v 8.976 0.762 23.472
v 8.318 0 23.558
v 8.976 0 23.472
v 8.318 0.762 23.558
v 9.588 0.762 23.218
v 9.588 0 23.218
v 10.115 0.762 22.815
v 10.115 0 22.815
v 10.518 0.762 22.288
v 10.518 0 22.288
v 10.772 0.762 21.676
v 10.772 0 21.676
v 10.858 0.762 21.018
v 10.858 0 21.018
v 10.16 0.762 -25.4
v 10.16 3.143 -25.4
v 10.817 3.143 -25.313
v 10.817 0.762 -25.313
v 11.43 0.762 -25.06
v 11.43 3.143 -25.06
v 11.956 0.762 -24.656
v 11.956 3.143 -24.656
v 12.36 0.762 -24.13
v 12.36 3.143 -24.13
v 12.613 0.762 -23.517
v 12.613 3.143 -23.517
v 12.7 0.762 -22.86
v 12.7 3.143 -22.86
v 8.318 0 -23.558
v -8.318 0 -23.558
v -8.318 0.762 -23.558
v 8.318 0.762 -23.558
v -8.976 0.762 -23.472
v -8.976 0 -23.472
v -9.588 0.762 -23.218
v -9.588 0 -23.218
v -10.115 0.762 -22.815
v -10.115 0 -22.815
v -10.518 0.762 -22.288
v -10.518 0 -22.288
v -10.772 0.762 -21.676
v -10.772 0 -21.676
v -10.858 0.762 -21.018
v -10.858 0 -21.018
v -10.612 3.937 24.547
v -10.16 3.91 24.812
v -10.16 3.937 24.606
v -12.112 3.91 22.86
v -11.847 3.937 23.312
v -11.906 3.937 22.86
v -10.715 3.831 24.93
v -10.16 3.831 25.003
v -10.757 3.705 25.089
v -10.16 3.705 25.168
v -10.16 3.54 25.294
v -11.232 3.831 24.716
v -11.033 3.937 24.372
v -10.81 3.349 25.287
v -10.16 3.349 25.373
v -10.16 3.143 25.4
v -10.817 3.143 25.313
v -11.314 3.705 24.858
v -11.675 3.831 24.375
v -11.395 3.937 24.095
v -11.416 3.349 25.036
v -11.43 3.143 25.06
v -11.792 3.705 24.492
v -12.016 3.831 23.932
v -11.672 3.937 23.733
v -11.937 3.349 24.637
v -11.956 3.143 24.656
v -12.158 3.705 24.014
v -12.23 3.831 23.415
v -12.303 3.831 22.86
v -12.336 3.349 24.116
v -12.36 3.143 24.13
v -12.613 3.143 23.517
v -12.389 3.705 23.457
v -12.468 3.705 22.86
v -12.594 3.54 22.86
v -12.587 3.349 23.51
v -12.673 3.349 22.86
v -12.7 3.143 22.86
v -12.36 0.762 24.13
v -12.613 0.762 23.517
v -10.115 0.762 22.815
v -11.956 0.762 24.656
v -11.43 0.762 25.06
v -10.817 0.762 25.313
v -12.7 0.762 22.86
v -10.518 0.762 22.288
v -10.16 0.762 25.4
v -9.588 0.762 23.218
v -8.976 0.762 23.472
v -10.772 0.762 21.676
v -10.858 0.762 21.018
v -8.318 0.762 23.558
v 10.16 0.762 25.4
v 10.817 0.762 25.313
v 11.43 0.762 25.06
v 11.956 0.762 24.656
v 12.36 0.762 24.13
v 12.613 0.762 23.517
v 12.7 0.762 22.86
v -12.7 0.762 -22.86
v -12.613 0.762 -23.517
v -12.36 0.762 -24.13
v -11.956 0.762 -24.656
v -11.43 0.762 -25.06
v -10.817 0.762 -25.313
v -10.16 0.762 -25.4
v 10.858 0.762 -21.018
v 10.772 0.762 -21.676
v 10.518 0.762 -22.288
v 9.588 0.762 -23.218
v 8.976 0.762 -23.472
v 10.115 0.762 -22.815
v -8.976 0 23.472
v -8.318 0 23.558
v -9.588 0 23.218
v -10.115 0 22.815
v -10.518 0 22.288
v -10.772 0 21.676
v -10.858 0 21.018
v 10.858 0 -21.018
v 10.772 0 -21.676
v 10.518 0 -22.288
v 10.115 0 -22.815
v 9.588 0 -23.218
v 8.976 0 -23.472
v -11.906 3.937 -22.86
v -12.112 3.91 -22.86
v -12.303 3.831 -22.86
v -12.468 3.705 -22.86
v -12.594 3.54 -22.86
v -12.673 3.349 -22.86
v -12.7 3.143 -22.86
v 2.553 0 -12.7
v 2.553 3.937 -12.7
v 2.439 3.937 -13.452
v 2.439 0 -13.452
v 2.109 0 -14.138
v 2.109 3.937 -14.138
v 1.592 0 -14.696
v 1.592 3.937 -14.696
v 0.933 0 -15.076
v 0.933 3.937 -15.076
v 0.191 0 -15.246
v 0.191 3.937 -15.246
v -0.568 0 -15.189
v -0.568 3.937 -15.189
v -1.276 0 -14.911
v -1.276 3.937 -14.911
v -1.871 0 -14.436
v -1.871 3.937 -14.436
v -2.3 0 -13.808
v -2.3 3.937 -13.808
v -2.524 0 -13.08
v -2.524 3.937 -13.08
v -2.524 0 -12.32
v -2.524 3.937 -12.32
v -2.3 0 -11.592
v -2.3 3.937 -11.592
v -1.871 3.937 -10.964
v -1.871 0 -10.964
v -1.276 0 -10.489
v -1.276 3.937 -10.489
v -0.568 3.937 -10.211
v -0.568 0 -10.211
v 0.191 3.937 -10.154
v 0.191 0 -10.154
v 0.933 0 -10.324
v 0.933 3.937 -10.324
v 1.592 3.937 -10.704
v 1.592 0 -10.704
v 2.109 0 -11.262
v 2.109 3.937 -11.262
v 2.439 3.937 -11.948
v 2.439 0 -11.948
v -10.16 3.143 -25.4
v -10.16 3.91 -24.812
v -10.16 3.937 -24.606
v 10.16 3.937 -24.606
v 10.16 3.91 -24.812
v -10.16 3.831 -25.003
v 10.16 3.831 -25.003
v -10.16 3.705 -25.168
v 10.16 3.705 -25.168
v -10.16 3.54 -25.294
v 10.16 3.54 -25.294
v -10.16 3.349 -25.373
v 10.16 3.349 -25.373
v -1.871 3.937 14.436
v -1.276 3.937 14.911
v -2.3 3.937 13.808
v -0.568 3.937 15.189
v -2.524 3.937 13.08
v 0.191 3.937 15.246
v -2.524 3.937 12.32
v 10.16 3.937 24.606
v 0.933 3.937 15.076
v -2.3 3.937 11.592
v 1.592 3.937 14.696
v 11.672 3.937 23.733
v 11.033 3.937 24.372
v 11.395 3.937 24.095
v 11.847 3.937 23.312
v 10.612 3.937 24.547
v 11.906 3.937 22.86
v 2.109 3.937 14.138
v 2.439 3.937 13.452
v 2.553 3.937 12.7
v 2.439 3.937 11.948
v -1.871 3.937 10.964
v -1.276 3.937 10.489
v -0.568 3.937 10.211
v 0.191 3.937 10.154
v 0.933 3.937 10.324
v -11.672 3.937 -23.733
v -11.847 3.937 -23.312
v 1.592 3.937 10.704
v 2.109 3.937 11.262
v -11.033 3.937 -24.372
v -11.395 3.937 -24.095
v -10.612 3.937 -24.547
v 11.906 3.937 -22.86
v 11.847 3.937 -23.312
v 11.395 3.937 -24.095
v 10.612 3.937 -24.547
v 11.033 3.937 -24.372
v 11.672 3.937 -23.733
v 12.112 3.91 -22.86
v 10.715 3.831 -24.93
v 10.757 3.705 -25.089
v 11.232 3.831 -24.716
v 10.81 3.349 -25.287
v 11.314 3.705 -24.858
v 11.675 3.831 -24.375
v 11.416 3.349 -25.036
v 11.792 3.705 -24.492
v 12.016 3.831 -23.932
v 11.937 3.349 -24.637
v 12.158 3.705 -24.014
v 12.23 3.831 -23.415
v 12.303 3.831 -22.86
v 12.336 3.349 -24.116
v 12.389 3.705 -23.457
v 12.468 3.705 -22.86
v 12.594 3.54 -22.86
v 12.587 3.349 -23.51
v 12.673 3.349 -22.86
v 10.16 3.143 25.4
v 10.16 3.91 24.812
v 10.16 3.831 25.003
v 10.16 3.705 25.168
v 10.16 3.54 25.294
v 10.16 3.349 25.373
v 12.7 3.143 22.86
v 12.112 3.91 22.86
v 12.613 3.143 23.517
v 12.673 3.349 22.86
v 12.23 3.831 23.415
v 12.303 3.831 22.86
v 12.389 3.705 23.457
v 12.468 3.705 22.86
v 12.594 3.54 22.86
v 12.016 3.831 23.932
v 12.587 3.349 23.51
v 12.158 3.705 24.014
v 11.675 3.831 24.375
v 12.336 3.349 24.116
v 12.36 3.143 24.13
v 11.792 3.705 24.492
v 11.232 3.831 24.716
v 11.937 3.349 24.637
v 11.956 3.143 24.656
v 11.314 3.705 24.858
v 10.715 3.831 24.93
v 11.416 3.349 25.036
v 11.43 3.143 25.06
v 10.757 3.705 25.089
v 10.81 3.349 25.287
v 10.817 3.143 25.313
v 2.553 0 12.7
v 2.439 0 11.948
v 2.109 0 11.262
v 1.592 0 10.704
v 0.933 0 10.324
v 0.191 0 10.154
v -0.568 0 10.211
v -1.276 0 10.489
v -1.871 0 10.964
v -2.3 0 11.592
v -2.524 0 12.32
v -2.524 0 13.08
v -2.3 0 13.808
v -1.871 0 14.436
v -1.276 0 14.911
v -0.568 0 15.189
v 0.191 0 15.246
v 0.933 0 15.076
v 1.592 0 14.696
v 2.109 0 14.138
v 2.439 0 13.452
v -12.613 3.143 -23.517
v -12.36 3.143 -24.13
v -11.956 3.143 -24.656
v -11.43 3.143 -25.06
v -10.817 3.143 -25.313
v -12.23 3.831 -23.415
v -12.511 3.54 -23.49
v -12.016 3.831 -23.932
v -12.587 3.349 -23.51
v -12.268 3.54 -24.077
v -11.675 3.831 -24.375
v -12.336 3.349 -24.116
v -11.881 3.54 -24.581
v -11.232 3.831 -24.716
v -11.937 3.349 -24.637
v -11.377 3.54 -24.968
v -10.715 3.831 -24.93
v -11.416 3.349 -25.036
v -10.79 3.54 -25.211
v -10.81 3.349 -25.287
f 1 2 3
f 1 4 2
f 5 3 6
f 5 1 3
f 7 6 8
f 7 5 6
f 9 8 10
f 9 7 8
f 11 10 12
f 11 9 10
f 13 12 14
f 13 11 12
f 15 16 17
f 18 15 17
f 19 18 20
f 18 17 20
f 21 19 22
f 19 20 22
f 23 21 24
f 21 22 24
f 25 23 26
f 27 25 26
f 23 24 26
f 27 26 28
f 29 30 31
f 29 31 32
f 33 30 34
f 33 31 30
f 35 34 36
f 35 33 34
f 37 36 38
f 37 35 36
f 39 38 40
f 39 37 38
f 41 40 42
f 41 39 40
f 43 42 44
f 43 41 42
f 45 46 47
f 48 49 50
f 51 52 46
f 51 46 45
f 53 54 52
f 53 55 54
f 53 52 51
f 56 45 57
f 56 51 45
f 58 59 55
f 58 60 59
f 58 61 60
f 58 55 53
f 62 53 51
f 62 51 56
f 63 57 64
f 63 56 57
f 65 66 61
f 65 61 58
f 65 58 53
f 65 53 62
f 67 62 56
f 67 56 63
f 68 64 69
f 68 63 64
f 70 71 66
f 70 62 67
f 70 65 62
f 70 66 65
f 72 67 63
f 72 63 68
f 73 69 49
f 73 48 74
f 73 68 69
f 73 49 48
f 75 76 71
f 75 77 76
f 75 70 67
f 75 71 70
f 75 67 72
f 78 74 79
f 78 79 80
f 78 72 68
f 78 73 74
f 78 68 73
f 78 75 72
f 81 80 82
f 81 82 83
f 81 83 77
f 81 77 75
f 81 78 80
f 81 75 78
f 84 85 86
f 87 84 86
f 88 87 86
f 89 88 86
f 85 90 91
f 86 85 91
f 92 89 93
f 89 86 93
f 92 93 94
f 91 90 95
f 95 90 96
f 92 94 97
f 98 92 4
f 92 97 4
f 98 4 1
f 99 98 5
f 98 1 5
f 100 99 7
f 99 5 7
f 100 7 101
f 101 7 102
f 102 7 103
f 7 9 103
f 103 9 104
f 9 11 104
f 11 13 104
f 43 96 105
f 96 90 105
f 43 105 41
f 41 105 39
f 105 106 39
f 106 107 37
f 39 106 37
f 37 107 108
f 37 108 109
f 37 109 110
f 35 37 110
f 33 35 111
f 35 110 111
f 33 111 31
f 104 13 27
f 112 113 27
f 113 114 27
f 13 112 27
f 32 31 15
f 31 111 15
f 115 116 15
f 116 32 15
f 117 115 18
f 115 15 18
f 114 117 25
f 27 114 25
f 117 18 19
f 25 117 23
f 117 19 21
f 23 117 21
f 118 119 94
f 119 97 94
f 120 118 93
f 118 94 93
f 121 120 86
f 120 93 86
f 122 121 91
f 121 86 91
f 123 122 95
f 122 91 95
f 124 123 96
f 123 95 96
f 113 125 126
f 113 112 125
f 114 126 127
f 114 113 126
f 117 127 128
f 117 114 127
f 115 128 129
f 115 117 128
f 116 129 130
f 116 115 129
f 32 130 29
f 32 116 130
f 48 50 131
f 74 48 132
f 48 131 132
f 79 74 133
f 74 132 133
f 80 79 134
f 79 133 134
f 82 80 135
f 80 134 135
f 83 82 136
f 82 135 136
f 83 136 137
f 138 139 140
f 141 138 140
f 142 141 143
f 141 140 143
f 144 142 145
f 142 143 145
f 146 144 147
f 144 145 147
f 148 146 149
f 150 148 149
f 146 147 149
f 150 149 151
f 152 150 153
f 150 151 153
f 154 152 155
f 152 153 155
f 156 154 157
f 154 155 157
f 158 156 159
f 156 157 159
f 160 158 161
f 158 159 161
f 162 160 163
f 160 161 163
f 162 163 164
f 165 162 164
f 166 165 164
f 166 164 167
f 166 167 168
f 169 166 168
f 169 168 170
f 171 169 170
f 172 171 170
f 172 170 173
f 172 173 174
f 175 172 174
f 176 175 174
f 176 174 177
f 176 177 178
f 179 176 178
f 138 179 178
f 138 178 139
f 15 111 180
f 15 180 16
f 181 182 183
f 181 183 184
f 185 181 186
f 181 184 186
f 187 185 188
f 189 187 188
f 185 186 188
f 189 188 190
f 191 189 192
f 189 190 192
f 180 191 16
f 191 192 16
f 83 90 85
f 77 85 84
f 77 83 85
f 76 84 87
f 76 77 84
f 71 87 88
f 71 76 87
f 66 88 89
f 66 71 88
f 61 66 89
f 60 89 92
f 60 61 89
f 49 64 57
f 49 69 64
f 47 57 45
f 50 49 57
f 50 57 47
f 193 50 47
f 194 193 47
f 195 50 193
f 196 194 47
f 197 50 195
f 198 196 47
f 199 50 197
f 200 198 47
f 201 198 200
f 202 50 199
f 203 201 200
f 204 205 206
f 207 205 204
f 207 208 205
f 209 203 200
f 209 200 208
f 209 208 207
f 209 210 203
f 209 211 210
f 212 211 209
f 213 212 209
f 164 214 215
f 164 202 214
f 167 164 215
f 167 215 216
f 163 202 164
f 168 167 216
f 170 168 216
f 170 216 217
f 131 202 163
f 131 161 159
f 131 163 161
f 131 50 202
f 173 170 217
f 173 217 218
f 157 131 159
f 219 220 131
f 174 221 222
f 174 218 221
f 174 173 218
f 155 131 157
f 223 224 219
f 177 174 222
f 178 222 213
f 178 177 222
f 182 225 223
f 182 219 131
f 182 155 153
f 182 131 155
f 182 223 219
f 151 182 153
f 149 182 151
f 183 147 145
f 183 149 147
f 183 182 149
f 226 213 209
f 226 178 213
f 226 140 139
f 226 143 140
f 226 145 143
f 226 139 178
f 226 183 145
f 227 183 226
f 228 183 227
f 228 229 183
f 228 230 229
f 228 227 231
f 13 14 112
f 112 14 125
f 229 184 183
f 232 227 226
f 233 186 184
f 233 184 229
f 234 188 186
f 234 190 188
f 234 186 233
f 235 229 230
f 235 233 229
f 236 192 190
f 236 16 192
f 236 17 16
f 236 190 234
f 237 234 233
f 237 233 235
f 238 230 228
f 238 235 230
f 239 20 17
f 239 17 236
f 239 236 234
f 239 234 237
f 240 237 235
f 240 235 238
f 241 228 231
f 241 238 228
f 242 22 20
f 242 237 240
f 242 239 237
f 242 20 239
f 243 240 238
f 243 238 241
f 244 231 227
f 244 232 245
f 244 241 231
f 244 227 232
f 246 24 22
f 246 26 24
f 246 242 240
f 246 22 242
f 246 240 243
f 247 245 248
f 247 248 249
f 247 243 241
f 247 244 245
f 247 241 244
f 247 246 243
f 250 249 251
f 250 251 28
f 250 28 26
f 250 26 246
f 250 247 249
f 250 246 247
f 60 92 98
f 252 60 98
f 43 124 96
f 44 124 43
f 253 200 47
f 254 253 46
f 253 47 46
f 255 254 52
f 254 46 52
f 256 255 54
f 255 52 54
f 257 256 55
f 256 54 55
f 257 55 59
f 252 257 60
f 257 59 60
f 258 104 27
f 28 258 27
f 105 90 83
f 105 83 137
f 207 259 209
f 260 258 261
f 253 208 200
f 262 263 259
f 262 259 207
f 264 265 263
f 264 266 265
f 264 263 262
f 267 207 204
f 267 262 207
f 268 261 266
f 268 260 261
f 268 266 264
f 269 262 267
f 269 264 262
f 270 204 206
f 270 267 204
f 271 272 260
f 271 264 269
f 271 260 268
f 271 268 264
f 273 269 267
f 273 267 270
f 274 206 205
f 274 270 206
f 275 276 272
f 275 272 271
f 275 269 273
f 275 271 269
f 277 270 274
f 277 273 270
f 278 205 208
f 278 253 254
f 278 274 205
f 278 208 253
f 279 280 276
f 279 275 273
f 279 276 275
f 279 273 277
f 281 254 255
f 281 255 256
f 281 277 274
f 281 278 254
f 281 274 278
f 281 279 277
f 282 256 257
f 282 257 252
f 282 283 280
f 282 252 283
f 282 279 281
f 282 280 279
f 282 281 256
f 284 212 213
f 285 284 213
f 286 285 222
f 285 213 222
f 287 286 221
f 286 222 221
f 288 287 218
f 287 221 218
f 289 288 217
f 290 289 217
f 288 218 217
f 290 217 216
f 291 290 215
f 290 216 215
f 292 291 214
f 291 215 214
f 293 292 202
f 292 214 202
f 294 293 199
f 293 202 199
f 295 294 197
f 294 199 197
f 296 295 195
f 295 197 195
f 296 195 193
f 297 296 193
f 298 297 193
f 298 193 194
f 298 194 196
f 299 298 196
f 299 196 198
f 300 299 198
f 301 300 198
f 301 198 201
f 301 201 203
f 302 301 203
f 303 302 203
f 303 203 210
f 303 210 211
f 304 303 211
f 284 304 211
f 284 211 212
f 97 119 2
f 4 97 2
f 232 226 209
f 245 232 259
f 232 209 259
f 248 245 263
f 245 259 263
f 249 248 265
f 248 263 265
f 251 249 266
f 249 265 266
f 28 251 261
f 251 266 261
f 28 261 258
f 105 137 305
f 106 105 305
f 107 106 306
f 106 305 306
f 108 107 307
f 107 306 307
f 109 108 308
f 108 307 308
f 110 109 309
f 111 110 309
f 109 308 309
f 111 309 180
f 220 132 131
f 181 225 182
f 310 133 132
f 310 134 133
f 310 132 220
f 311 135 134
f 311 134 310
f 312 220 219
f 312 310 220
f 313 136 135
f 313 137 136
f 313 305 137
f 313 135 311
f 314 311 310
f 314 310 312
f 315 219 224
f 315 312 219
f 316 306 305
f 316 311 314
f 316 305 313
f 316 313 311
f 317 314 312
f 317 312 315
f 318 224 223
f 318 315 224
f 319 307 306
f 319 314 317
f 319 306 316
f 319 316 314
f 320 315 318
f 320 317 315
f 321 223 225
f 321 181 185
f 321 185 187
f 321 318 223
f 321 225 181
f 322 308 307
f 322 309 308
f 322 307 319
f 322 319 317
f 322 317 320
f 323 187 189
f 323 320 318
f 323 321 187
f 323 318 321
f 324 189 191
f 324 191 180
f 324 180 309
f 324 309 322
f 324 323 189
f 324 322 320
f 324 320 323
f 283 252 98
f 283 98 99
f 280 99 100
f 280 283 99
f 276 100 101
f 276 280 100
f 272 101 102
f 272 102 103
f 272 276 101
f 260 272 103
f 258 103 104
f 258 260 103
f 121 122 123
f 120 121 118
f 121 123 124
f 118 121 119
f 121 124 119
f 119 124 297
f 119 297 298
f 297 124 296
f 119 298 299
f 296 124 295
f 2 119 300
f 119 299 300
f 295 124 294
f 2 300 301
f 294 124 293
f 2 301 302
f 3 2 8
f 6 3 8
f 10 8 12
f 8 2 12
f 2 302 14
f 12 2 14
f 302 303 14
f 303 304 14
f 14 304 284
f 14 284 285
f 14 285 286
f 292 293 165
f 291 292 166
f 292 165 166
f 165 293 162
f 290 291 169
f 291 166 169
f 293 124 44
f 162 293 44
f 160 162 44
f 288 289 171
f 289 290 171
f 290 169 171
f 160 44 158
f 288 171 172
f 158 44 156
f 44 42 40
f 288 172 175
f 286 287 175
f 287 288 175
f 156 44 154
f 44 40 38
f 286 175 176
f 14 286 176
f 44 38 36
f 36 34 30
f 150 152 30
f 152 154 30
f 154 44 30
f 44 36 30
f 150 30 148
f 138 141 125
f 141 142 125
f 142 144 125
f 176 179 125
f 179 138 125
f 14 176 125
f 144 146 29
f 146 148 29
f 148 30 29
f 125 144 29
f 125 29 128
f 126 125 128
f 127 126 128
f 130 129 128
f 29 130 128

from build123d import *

# Parameters (mm, degrees)
SKETCH1_W           = 21.717
SKETCH1_H           = 47.117
BOSS_EXTRUDE1_DEPTH = 0.762
SKETCH2_W           = 25.4
SKETCH2_H           = 50.8
BOSS_EXTRUDE2_DEPTH = 3.175
SKETCH3_R           = 2.5527
CUT_EXTRUDE1_DEPTH  = 4.937
FILLET1_R           = 2.54
FILLET3_R           = 0.79375


with BuildPart() as part:
    # Sketch1 → Boss-Extrude1 (new body)
    with BuildSketch(Plane(origin=(0, 0, 0), x_dir=(1, 0, 0), z_dir=(0, 1, 0))):
        Rectangle(SKETCH1_W, SKETCH1_H)
    extrude(amount=BOSS_EXTRUDE1_DEPTH)

    # Sketch2 → Boss-Extrude2 (add)
    with BuildSketch(Plane(origin=(0, 0.762, 0), x_dir=(1, 0, 0), z_dir=(0, 1, 0))):
        Rectangle(SKETCH2_W, SKETCH2_H)
    extrude(amount=BOSS_EXTRUDE2_DEPTH)

    # Sketch3 → Cut-Extrude1 (cut, through all)
    with BuildSketch(Plane(origin=(0, 3.937, 0), x_dir=(1, 0, 0), z_dir=(0, 1, 0))):
        with Locations((0, 12.7)):
            Circle(SKETCH3_R)
        with Locations((0, -12.7)):
            Circle(SKETCH3_R)
    extrude(amount=-CUT_EXTRUDE1_DEPTH, mode=Mode.SUBTRACT)

    # Fillet1
    fillet1_edges = [part.edges().sort_by_distance(p)[0] for p in [
        (12.7, 2.3495, 25.4),
        (12.7, 2.3495, -25.4),
        (-12.7, 2.3495, -25.4),
        (-12.7, 2.3495, 25.4),
        (-10.8585, 0.381, -23.5585),
        (10.8585, 0.381, -23.5585),
        (10.8585, 0.381, 23.5585),
        (-10.8585, 0.381, 23.5585),
    ]]
    fillet(fillet1_edges, radius=FILLET1_R)

    # Fillet3
    fillet3_edges = [part.edges().sort_by_distance(p)[0] for p in [
        (0, 3.937, -25.4),
        (12.7, 3.937, 0),
        (-12.7, 3.937, 0),
        (0, 3.937, 25.4),
        (-11.956051224, 3.937, 24.656051224),
        (-11.956051224, 3.937, -24.656051224),
        (11.956051224, 3.937, 24.656051224),
        (11.956051224, 3.937, -24.656051224),
    ]]
    fillet(fillet3_edges, radius=FILLET3_R)


solid = part.part
